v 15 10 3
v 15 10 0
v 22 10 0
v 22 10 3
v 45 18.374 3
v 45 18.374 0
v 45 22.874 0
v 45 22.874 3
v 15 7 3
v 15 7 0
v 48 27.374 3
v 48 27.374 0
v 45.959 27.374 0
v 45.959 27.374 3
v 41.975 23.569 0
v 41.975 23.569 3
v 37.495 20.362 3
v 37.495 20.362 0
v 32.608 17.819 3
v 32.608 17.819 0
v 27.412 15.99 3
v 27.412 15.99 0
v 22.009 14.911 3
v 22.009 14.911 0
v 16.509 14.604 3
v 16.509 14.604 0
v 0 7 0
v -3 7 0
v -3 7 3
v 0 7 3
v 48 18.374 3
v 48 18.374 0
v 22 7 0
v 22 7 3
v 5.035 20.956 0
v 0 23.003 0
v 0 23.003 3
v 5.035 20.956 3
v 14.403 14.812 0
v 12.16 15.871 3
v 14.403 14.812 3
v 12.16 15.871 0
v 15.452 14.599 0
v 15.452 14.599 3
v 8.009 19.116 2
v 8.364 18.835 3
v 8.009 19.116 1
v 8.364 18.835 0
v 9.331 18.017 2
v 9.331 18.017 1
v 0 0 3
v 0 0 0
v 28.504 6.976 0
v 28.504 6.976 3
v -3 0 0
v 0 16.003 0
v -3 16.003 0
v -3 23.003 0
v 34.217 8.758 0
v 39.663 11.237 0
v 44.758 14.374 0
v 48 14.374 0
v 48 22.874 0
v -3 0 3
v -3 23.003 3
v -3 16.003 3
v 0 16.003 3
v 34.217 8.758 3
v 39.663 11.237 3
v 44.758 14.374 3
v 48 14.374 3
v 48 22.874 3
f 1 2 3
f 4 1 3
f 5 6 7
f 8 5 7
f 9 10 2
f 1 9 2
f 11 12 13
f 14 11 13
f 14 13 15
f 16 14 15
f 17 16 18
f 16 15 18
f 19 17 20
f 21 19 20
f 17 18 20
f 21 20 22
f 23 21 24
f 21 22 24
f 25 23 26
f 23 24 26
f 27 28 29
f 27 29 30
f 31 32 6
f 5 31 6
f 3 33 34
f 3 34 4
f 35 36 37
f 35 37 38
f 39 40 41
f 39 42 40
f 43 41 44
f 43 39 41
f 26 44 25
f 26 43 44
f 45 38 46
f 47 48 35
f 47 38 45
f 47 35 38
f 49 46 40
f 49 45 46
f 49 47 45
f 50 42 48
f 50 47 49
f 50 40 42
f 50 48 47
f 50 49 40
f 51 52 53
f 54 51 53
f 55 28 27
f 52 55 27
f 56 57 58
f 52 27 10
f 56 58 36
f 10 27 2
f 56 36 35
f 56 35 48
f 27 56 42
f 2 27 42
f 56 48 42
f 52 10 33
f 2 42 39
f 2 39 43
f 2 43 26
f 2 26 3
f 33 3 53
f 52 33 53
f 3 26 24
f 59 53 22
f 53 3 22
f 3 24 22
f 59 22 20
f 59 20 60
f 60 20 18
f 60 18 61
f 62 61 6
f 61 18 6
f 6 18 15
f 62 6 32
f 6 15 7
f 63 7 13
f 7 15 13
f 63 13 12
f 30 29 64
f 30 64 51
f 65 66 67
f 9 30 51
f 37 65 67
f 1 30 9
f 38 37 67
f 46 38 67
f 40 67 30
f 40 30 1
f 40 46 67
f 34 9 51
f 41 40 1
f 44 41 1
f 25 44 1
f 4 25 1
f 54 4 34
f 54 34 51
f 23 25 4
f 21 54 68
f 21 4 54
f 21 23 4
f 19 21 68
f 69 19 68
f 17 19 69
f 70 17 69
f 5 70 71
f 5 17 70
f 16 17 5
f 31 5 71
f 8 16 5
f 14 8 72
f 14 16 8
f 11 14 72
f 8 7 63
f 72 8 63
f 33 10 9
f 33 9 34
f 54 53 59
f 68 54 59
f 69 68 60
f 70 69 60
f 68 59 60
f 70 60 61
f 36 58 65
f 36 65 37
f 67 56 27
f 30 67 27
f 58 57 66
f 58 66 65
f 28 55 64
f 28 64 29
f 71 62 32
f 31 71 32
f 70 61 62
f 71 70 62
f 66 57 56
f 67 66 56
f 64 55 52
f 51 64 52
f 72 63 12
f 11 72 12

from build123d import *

# Parameters (mm, degrees)
CROQUIS2_W              = 3
CROQUIS2_H              = 7
SALIENTE_EXTRUIR1_DEPTH = 3
CROQUIS3_W              = 7
CROQUIS3_H              = 3
CORTAR_EXTRUIR1_DEPTH   = 3
SALIENTE_EXTRUIR2_DEPTH = 3


with BuildPart() as part:
    # Croquis2 → Saliente-Extruir1 (new body)
    with BuildSketch(Plane.XY):
        with BuildLine():
            ThreePointArc((28.504213464, 6.97614846), (38.823203621, 10.80038439), (48, 16.874324342))
            Line((48, 16.874324342), (48, 18.374324342))
            Line((48, 18.374324342), (45, 18.374324342))
            Line((45, 18.374324342), (45, 22.874324342))
            Line((45, 22.874324342), (48, 22.874324342))
            Line((48, 22.874324342), (48, 27.374324342))
            Line((48, 27.374324342), (45.958765785, 27.374324342))
            ThreePointArc((45.958765785, 27.374324342), (32.608459646, 17.819059857), (16.508760518, 14.604492799))
            add(Edge.make_bspline(
                [(0, 23.003403927), (3.768895236, 21.748521109), (6.947387732, 20.10306336), (11.1476301, 16.408164217), (14.028002641, 14.311208734), (16.508760518, 14.604492799)],
                knots=[0, 0, 0, 0, 0.366175843, 0.466175843, 1, 1, 1, 1], degree=3))
            Line((0, 23.003403927), (0, 16.003403927))
            Line((0, 16.003403927), (0, 7))
            Line((0, 7), (0, 0))
            Line((0, 0), (28.504213464, 6.97614846))
        make_face()
        with Locations((-1.5, 3.5)):
            Rectangle(CROQUIS2_W, CROQUIS2_H)
        with Locations((-1.5, 19.503403927)):
            Rectangle(CROQUIS2_W, CROQUIS2_H)
    extrude(amount=SALIENTE_EXTRUIR1_DEPTH)

    # Croquis3 → Cortar-Extruir1 (cut)
    with BuildSketch(Plane.XY):
        with Locations((18.5, 8.5)):
            Rectangle(CROQUIS3_W, CROQUIS3_H)
    extrude(amount=CORTAR_EXTRUIR1_DEPTH, mode=Mode.SUBTRACT)

    # Croquis4 → Saliente-Extruir2 (add)
    with BuildSketch(Plane.XY):
        with BuildLine():
            Line((45, 18.374324342), (45, 14.546008954))
            ThreePointArc((45, 14.546008954), (44.879211841, 14.45997986), (44.758158478, 14.374324342))
            Line((44.758158478, 14.374324342), (48, 14.374324342))
            Line((48, 14.374324342), (48, 18.374324342))
            Line((48, 18.374324342), (45, 18.374324342))
        make_face()
    extrude(amount=SALIENTE_EXTRUIR2_DEPTH)


solid = part.part
